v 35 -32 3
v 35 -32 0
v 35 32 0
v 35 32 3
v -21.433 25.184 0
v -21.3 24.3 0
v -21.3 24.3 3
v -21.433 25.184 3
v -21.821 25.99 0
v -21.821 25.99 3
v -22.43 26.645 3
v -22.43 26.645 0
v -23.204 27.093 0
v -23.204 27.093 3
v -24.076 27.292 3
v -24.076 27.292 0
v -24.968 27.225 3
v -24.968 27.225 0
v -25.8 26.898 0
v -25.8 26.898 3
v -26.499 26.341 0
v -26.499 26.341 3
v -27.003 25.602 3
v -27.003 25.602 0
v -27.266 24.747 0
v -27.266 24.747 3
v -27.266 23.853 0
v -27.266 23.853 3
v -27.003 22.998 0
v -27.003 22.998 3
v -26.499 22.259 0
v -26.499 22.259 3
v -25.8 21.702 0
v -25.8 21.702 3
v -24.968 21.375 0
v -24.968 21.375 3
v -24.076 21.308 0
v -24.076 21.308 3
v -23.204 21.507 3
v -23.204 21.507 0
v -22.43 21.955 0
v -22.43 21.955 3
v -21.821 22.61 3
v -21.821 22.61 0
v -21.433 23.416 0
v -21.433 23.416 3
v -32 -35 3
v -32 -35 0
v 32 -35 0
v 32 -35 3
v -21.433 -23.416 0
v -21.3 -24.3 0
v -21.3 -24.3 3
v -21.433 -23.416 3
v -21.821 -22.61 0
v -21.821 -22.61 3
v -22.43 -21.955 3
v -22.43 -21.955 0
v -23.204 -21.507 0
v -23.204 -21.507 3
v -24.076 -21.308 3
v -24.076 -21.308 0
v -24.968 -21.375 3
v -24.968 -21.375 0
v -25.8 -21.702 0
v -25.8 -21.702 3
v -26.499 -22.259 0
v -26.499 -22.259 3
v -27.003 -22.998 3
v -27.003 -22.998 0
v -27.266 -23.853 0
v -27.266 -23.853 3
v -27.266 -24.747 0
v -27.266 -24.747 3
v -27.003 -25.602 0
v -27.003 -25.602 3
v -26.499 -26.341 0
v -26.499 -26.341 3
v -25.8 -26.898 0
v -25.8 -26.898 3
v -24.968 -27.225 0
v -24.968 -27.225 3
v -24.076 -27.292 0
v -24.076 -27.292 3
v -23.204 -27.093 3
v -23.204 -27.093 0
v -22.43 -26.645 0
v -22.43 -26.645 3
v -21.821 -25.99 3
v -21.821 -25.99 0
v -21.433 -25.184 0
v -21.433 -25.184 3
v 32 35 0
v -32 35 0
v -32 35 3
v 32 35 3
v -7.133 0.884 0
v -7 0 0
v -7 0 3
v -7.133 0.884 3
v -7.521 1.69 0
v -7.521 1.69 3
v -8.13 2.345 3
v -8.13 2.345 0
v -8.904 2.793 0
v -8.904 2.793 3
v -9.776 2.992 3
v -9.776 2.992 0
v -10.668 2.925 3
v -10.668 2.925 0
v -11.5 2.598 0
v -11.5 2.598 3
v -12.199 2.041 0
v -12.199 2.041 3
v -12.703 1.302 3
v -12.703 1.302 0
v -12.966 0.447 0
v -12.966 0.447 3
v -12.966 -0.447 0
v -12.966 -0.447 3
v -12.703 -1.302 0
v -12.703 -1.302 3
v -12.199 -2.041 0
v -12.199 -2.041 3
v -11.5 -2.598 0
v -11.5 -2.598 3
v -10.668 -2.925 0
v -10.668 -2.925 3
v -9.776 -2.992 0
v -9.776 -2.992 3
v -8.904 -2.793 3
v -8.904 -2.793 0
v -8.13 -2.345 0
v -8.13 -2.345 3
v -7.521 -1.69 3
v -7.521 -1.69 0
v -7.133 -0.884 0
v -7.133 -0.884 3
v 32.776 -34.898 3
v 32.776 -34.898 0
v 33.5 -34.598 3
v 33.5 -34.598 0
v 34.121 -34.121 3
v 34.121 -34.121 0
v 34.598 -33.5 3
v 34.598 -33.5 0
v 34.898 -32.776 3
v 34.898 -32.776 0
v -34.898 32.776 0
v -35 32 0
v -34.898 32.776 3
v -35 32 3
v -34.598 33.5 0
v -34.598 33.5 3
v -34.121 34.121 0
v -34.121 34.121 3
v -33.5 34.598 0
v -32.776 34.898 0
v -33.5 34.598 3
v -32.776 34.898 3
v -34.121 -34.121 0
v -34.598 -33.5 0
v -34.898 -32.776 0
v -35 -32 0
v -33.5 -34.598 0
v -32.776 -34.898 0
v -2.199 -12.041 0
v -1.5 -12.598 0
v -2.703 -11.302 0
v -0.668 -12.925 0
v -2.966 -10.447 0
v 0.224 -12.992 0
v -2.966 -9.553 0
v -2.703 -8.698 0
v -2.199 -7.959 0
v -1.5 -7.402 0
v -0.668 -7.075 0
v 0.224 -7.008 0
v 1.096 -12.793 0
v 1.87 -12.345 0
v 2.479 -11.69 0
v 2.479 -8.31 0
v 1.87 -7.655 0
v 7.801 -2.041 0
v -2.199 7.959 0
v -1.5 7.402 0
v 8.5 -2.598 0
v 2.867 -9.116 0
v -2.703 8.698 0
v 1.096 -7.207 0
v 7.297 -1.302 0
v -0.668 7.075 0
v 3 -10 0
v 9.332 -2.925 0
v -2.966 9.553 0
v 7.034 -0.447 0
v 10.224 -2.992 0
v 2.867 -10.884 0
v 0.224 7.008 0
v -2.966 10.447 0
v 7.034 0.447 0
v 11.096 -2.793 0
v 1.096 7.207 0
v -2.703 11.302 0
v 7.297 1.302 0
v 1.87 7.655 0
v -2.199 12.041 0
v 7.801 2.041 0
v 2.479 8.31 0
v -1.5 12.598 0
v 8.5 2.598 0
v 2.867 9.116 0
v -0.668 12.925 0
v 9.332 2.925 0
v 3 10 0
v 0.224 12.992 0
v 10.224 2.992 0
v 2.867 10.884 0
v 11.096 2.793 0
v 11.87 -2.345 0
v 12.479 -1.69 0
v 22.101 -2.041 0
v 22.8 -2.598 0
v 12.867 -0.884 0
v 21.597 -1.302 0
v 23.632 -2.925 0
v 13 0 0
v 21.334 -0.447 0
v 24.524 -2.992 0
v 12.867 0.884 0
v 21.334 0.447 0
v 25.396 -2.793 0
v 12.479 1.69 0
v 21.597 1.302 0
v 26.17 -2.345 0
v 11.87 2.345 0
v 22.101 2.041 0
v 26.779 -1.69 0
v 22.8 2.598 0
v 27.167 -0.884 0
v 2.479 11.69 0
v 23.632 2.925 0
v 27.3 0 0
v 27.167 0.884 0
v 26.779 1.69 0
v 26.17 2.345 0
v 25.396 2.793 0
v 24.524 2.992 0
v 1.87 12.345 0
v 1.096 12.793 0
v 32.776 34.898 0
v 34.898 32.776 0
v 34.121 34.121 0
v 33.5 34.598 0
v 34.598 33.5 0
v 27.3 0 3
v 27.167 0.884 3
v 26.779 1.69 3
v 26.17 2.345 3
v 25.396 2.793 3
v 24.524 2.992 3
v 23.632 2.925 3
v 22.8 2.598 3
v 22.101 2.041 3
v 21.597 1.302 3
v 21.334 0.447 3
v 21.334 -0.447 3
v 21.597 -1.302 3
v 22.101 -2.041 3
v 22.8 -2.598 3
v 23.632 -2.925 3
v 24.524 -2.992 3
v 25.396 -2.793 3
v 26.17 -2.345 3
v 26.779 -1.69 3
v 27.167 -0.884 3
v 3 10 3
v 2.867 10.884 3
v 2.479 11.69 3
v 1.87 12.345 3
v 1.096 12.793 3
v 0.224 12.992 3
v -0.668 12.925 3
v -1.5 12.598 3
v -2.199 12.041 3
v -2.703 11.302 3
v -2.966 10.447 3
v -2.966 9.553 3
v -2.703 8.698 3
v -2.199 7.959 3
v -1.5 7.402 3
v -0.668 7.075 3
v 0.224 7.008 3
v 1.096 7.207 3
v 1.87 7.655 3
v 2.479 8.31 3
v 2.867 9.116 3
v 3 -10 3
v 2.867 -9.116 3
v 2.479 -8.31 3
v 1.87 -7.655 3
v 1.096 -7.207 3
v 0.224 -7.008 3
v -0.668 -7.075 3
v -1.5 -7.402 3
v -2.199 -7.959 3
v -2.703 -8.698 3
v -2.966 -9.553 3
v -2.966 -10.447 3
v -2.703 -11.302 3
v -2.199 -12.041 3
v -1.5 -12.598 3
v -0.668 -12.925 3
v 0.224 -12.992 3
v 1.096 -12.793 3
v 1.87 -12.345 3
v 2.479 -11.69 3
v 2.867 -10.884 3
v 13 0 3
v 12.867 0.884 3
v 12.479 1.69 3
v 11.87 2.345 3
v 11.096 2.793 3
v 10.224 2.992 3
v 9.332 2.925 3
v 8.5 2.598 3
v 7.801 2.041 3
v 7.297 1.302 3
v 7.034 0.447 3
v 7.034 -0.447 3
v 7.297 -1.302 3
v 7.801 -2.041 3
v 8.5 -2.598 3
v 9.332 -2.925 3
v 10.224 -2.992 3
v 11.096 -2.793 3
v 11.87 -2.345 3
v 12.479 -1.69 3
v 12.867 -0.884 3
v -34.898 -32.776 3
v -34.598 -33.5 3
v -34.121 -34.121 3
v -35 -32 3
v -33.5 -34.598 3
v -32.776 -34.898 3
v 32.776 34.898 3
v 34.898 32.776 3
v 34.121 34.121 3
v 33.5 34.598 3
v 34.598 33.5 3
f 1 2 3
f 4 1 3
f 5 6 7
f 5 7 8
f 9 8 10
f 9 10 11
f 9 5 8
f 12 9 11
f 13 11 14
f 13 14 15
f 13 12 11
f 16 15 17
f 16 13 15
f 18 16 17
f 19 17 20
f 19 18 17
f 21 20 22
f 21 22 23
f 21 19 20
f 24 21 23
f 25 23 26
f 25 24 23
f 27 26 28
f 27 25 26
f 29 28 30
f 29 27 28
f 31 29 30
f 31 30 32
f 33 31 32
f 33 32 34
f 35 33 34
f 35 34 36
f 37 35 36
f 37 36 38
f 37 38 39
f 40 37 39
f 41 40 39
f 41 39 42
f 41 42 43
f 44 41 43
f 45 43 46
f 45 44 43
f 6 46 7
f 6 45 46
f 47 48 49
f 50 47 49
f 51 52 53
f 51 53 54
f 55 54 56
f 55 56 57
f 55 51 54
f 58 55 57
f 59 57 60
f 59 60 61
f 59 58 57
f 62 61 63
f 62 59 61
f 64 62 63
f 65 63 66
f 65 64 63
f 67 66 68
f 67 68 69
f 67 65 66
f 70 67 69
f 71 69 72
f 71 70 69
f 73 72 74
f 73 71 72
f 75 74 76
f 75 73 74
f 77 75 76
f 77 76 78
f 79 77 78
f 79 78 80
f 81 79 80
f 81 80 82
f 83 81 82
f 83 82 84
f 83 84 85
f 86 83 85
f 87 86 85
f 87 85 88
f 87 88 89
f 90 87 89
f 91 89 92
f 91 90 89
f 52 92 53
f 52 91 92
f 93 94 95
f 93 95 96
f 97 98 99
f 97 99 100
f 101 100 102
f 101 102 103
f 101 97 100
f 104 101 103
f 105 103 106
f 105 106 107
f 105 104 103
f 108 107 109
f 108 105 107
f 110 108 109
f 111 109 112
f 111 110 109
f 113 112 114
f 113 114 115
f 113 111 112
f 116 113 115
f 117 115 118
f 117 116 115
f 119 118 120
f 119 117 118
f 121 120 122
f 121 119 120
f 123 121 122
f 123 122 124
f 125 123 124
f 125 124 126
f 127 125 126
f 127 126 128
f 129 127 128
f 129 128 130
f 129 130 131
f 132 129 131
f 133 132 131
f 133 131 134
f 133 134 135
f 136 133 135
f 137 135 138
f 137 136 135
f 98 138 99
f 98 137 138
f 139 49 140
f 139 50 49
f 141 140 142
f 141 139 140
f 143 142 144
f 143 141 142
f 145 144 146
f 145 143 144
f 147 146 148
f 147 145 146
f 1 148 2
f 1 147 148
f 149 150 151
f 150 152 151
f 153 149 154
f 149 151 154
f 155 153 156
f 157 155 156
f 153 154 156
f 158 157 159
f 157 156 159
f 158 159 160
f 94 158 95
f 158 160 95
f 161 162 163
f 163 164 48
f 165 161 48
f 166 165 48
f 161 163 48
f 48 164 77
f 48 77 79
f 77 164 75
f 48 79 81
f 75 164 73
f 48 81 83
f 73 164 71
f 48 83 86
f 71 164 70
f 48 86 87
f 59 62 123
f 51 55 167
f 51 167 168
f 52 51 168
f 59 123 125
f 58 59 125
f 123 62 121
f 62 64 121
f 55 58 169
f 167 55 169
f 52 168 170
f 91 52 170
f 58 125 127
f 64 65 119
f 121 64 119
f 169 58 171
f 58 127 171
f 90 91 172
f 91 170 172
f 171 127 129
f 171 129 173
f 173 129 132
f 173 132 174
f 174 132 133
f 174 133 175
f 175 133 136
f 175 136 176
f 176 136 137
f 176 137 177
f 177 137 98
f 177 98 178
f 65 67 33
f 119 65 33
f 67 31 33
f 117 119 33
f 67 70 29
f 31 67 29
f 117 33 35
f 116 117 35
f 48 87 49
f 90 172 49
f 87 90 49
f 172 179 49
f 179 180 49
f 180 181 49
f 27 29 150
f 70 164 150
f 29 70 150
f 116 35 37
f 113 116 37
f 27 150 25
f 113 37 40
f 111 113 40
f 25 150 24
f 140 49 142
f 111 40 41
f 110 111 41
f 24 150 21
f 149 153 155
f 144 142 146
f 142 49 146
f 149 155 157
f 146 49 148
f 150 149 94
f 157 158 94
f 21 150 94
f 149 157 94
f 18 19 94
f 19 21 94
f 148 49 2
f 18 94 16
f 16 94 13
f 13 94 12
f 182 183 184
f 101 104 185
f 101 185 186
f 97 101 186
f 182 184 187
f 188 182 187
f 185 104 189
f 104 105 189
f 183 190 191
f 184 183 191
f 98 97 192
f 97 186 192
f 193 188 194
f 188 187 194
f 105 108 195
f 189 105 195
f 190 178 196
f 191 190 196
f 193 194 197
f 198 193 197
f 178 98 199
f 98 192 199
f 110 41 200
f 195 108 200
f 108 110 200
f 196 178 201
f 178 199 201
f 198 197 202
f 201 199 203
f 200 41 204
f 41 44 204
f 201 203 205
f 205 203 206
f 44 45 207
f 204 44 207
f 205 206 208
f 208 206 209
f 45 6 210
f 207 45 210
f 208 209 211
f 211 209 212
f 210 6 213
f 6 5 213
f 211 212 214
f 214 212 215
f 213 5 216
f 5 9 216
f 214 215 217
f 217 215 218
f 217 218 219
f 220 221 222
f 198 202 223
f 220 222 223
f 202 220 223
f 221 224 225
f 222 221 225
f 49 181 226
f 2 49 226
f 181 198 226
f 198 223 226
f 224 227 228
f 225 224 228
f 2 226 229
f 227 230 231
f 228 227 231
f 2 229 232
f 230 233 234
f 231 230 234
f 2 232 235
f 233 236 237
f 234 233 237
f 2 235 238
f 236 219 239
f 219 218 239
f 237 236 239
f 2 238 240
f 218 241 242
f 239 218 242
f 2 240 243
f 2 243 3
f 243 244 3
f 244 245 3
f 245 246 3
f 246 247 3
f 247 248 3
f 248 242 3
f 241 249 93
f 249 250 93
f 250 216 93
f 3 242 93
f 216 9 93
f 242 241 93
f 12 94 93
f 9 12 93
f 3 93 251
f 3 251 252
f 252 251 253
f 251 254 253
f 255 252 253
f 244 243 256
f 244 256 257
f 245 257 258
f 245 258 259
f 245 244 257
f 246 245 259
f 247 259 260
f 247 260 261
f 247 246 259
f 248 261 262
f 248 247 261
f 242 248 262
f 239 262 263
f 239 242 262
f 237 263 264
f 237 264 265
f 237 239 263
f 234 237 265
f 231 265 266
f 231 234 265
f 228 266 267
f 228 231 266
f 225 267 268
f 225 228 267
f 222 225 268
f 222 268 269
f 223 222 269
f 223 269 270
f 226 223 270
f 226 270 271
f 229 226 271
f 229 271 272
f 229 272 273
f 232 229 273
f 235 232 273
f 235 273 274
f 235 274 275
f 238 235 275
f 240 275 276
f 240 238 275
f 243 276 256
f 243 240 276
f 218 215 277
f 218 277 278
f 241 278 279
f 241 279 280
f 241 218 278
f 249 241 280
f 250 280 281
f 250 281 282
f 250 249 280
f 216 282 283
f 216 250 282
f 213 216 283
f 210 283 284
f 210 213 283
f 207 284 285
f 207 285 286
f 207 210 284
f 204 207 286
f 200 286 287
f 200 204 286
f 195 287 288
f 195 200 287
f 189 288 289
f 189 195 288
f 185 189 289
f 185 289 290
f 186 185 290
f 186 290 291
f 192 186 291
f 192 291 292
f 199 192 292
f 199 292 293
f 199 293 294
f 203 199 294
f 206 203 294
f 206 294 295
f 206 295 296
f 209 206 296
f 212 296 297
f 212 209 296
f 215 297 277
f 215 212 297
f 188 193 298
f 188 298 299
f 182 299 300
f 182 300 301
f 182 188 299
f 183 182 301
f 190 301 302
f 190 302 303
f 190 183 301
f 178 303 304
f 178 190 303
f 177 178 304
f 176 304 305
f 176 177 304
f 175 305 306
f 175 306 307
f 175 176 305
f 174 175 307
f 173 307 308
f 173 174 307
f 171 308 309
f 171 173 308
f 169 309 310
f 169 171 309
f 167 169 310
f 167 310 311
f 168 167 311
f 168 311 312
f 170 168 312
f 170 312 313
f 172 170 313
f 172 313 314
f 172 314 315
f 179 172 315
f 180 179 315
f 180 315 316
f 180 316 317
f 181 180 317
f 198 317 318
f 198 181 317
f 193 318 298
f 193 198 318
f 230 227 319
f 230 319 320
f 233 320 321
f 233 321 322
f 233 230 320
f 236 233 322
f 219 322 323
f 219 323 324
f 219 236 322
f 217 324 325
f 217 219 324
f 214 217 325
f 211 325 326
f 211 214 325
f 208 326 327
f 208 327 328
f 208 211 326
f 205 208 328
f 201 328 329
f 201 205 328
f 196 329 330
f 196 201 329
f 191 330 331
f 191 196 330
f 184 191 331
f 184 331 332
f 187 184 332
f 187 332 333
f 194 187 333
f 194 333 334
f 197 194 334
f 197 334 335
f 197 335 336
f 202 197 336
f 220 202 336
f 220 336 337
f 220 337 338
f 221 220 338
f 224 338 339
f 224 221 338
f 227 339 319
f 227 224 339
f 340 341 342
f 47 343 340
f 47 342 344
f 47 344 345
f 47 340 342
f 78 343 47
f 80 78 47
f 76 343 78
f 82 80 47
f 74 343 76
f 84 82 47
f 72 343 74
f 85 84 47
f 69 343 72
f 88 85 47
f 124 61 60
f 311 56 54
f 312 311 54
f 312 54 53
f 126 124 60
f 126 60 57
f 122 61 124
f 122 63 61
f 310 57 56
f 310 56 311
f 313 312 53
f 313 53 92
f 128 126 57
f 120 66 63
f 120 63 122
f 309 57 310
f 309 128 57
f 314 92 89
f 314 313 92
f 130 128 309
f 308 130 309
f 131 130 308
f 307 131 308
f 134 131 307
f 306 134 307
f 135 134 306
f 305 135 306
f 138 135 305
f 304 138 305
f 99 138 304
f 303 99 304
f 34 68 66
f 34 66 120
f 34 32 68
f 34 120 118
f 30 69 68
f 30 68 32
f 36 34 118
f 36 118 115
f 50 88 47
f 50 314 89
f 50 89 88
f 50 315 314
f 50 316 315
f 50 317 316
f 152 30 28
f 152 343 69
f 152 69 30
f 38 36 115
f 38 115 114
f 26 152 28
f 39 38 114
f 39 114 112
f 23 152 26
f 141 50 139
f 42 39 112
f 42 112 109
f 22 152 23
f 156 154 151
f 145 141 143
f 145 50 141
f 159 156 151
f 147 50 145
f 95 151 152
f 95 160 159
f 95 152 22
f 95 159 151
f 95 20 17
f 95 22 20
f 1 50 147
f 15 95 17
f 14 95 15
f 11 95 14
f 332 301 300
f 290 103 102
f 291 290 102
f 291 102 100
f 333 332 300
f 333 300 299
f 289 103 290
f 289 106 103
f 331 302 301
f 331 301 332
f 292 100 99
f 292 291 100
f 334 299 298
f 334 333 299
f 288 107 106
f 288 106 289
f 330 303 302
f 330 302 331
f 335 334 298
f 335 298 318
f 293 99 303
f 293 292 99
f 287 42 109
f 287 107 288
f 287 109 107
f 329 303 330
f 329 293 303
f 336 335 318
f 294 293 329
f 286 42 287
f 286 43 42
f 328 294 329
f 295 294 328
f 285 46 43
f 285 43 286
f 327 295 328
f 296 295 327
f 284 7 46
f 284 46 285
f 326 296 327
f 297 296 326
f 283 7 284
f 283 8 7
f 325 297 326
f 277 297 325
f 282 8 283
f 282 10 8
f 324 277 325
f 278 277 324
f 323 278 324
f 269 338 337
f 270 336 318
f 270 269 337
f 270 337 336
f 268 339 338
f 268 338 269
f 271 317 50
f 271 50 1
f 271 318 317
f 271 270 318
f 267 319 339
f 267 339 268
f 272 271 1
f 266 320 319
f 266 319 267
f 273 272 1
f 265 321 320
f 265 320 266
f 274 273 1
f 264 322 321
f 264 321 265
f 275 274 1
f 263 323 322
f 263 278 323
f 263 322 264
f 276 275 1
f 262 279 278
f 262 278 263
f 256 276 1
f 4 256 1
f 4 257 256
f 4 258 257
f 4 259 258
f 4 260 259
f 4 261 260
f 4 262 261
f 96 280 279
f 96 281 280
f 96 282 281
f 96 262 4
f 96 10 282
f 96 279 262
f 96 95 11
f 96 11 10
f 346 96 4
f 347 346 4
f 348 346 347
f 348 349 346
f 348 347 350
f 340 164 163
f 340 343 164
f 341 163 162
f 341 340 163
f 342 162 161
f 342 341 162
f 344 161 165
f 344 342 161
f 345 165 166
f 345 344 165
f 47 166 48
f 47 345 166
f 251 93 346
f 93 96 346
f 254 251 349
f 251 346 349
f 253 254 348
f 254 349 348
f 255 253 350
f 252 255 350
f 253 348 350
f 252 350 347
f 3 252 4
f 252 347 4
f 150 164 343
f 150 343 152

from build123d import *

# Parameters (mm, degrees)
SKETCH3_W           = 70
SKETCH3_H           = 70
SKETCH3_R           = 3
BOSS_EXTRUDE2_DEPTH = 3
FILLET2_R           = 3


with BuildPart() as part:
    # Sketch3 → Boss-Extrude2 (new body)
    with BuildSketch(Plane.XY):
        Rectangle(SKETCH3_W, SKETCH3_H)
        with Locations((0, 10)):
            Circle(SKETCH3_R, mode=Mode.SUBTRACT)
        with Locations((-24.3, 24.3)):
            Circle(SKETCH3_R, mode=Mode.SUBTRACT)
        with Locations((10, 0)):
            Circle(SKETCH3_R, mode=Mode.SUBTRACT)
        with Locations((0, -10)):
            Circle(SKETCH3_R, mode=Mode.SUBTRACT)
        with Locations((-10, 0)):
            Circle(SKETCH3_R, mode=Mode.SUBTRACT)
        with Locations((-24.3, -24.3)):
            Circle(SKETCH3_R, mode=Mode.SUBTRACT)
        with Locations((24.3, 0)):
            Circle(SKETCH3_R, mode=Mode.SUBTRACT)
    extrude(amount=BOSS_EXTRUDE2_DEPTH)

    # Fillet2
    fillet2_edges = [part.edges().sort_by_distance(p)[0] for p in [
        (35, -35, 1.5),
        (-35, -35, 1.5),
        (-35, 35, 1.5),
        (35, 35, 1.5),
    ]]
    fillet(fillet2_edges, radius=FILLET2_R)


solid = part.part
